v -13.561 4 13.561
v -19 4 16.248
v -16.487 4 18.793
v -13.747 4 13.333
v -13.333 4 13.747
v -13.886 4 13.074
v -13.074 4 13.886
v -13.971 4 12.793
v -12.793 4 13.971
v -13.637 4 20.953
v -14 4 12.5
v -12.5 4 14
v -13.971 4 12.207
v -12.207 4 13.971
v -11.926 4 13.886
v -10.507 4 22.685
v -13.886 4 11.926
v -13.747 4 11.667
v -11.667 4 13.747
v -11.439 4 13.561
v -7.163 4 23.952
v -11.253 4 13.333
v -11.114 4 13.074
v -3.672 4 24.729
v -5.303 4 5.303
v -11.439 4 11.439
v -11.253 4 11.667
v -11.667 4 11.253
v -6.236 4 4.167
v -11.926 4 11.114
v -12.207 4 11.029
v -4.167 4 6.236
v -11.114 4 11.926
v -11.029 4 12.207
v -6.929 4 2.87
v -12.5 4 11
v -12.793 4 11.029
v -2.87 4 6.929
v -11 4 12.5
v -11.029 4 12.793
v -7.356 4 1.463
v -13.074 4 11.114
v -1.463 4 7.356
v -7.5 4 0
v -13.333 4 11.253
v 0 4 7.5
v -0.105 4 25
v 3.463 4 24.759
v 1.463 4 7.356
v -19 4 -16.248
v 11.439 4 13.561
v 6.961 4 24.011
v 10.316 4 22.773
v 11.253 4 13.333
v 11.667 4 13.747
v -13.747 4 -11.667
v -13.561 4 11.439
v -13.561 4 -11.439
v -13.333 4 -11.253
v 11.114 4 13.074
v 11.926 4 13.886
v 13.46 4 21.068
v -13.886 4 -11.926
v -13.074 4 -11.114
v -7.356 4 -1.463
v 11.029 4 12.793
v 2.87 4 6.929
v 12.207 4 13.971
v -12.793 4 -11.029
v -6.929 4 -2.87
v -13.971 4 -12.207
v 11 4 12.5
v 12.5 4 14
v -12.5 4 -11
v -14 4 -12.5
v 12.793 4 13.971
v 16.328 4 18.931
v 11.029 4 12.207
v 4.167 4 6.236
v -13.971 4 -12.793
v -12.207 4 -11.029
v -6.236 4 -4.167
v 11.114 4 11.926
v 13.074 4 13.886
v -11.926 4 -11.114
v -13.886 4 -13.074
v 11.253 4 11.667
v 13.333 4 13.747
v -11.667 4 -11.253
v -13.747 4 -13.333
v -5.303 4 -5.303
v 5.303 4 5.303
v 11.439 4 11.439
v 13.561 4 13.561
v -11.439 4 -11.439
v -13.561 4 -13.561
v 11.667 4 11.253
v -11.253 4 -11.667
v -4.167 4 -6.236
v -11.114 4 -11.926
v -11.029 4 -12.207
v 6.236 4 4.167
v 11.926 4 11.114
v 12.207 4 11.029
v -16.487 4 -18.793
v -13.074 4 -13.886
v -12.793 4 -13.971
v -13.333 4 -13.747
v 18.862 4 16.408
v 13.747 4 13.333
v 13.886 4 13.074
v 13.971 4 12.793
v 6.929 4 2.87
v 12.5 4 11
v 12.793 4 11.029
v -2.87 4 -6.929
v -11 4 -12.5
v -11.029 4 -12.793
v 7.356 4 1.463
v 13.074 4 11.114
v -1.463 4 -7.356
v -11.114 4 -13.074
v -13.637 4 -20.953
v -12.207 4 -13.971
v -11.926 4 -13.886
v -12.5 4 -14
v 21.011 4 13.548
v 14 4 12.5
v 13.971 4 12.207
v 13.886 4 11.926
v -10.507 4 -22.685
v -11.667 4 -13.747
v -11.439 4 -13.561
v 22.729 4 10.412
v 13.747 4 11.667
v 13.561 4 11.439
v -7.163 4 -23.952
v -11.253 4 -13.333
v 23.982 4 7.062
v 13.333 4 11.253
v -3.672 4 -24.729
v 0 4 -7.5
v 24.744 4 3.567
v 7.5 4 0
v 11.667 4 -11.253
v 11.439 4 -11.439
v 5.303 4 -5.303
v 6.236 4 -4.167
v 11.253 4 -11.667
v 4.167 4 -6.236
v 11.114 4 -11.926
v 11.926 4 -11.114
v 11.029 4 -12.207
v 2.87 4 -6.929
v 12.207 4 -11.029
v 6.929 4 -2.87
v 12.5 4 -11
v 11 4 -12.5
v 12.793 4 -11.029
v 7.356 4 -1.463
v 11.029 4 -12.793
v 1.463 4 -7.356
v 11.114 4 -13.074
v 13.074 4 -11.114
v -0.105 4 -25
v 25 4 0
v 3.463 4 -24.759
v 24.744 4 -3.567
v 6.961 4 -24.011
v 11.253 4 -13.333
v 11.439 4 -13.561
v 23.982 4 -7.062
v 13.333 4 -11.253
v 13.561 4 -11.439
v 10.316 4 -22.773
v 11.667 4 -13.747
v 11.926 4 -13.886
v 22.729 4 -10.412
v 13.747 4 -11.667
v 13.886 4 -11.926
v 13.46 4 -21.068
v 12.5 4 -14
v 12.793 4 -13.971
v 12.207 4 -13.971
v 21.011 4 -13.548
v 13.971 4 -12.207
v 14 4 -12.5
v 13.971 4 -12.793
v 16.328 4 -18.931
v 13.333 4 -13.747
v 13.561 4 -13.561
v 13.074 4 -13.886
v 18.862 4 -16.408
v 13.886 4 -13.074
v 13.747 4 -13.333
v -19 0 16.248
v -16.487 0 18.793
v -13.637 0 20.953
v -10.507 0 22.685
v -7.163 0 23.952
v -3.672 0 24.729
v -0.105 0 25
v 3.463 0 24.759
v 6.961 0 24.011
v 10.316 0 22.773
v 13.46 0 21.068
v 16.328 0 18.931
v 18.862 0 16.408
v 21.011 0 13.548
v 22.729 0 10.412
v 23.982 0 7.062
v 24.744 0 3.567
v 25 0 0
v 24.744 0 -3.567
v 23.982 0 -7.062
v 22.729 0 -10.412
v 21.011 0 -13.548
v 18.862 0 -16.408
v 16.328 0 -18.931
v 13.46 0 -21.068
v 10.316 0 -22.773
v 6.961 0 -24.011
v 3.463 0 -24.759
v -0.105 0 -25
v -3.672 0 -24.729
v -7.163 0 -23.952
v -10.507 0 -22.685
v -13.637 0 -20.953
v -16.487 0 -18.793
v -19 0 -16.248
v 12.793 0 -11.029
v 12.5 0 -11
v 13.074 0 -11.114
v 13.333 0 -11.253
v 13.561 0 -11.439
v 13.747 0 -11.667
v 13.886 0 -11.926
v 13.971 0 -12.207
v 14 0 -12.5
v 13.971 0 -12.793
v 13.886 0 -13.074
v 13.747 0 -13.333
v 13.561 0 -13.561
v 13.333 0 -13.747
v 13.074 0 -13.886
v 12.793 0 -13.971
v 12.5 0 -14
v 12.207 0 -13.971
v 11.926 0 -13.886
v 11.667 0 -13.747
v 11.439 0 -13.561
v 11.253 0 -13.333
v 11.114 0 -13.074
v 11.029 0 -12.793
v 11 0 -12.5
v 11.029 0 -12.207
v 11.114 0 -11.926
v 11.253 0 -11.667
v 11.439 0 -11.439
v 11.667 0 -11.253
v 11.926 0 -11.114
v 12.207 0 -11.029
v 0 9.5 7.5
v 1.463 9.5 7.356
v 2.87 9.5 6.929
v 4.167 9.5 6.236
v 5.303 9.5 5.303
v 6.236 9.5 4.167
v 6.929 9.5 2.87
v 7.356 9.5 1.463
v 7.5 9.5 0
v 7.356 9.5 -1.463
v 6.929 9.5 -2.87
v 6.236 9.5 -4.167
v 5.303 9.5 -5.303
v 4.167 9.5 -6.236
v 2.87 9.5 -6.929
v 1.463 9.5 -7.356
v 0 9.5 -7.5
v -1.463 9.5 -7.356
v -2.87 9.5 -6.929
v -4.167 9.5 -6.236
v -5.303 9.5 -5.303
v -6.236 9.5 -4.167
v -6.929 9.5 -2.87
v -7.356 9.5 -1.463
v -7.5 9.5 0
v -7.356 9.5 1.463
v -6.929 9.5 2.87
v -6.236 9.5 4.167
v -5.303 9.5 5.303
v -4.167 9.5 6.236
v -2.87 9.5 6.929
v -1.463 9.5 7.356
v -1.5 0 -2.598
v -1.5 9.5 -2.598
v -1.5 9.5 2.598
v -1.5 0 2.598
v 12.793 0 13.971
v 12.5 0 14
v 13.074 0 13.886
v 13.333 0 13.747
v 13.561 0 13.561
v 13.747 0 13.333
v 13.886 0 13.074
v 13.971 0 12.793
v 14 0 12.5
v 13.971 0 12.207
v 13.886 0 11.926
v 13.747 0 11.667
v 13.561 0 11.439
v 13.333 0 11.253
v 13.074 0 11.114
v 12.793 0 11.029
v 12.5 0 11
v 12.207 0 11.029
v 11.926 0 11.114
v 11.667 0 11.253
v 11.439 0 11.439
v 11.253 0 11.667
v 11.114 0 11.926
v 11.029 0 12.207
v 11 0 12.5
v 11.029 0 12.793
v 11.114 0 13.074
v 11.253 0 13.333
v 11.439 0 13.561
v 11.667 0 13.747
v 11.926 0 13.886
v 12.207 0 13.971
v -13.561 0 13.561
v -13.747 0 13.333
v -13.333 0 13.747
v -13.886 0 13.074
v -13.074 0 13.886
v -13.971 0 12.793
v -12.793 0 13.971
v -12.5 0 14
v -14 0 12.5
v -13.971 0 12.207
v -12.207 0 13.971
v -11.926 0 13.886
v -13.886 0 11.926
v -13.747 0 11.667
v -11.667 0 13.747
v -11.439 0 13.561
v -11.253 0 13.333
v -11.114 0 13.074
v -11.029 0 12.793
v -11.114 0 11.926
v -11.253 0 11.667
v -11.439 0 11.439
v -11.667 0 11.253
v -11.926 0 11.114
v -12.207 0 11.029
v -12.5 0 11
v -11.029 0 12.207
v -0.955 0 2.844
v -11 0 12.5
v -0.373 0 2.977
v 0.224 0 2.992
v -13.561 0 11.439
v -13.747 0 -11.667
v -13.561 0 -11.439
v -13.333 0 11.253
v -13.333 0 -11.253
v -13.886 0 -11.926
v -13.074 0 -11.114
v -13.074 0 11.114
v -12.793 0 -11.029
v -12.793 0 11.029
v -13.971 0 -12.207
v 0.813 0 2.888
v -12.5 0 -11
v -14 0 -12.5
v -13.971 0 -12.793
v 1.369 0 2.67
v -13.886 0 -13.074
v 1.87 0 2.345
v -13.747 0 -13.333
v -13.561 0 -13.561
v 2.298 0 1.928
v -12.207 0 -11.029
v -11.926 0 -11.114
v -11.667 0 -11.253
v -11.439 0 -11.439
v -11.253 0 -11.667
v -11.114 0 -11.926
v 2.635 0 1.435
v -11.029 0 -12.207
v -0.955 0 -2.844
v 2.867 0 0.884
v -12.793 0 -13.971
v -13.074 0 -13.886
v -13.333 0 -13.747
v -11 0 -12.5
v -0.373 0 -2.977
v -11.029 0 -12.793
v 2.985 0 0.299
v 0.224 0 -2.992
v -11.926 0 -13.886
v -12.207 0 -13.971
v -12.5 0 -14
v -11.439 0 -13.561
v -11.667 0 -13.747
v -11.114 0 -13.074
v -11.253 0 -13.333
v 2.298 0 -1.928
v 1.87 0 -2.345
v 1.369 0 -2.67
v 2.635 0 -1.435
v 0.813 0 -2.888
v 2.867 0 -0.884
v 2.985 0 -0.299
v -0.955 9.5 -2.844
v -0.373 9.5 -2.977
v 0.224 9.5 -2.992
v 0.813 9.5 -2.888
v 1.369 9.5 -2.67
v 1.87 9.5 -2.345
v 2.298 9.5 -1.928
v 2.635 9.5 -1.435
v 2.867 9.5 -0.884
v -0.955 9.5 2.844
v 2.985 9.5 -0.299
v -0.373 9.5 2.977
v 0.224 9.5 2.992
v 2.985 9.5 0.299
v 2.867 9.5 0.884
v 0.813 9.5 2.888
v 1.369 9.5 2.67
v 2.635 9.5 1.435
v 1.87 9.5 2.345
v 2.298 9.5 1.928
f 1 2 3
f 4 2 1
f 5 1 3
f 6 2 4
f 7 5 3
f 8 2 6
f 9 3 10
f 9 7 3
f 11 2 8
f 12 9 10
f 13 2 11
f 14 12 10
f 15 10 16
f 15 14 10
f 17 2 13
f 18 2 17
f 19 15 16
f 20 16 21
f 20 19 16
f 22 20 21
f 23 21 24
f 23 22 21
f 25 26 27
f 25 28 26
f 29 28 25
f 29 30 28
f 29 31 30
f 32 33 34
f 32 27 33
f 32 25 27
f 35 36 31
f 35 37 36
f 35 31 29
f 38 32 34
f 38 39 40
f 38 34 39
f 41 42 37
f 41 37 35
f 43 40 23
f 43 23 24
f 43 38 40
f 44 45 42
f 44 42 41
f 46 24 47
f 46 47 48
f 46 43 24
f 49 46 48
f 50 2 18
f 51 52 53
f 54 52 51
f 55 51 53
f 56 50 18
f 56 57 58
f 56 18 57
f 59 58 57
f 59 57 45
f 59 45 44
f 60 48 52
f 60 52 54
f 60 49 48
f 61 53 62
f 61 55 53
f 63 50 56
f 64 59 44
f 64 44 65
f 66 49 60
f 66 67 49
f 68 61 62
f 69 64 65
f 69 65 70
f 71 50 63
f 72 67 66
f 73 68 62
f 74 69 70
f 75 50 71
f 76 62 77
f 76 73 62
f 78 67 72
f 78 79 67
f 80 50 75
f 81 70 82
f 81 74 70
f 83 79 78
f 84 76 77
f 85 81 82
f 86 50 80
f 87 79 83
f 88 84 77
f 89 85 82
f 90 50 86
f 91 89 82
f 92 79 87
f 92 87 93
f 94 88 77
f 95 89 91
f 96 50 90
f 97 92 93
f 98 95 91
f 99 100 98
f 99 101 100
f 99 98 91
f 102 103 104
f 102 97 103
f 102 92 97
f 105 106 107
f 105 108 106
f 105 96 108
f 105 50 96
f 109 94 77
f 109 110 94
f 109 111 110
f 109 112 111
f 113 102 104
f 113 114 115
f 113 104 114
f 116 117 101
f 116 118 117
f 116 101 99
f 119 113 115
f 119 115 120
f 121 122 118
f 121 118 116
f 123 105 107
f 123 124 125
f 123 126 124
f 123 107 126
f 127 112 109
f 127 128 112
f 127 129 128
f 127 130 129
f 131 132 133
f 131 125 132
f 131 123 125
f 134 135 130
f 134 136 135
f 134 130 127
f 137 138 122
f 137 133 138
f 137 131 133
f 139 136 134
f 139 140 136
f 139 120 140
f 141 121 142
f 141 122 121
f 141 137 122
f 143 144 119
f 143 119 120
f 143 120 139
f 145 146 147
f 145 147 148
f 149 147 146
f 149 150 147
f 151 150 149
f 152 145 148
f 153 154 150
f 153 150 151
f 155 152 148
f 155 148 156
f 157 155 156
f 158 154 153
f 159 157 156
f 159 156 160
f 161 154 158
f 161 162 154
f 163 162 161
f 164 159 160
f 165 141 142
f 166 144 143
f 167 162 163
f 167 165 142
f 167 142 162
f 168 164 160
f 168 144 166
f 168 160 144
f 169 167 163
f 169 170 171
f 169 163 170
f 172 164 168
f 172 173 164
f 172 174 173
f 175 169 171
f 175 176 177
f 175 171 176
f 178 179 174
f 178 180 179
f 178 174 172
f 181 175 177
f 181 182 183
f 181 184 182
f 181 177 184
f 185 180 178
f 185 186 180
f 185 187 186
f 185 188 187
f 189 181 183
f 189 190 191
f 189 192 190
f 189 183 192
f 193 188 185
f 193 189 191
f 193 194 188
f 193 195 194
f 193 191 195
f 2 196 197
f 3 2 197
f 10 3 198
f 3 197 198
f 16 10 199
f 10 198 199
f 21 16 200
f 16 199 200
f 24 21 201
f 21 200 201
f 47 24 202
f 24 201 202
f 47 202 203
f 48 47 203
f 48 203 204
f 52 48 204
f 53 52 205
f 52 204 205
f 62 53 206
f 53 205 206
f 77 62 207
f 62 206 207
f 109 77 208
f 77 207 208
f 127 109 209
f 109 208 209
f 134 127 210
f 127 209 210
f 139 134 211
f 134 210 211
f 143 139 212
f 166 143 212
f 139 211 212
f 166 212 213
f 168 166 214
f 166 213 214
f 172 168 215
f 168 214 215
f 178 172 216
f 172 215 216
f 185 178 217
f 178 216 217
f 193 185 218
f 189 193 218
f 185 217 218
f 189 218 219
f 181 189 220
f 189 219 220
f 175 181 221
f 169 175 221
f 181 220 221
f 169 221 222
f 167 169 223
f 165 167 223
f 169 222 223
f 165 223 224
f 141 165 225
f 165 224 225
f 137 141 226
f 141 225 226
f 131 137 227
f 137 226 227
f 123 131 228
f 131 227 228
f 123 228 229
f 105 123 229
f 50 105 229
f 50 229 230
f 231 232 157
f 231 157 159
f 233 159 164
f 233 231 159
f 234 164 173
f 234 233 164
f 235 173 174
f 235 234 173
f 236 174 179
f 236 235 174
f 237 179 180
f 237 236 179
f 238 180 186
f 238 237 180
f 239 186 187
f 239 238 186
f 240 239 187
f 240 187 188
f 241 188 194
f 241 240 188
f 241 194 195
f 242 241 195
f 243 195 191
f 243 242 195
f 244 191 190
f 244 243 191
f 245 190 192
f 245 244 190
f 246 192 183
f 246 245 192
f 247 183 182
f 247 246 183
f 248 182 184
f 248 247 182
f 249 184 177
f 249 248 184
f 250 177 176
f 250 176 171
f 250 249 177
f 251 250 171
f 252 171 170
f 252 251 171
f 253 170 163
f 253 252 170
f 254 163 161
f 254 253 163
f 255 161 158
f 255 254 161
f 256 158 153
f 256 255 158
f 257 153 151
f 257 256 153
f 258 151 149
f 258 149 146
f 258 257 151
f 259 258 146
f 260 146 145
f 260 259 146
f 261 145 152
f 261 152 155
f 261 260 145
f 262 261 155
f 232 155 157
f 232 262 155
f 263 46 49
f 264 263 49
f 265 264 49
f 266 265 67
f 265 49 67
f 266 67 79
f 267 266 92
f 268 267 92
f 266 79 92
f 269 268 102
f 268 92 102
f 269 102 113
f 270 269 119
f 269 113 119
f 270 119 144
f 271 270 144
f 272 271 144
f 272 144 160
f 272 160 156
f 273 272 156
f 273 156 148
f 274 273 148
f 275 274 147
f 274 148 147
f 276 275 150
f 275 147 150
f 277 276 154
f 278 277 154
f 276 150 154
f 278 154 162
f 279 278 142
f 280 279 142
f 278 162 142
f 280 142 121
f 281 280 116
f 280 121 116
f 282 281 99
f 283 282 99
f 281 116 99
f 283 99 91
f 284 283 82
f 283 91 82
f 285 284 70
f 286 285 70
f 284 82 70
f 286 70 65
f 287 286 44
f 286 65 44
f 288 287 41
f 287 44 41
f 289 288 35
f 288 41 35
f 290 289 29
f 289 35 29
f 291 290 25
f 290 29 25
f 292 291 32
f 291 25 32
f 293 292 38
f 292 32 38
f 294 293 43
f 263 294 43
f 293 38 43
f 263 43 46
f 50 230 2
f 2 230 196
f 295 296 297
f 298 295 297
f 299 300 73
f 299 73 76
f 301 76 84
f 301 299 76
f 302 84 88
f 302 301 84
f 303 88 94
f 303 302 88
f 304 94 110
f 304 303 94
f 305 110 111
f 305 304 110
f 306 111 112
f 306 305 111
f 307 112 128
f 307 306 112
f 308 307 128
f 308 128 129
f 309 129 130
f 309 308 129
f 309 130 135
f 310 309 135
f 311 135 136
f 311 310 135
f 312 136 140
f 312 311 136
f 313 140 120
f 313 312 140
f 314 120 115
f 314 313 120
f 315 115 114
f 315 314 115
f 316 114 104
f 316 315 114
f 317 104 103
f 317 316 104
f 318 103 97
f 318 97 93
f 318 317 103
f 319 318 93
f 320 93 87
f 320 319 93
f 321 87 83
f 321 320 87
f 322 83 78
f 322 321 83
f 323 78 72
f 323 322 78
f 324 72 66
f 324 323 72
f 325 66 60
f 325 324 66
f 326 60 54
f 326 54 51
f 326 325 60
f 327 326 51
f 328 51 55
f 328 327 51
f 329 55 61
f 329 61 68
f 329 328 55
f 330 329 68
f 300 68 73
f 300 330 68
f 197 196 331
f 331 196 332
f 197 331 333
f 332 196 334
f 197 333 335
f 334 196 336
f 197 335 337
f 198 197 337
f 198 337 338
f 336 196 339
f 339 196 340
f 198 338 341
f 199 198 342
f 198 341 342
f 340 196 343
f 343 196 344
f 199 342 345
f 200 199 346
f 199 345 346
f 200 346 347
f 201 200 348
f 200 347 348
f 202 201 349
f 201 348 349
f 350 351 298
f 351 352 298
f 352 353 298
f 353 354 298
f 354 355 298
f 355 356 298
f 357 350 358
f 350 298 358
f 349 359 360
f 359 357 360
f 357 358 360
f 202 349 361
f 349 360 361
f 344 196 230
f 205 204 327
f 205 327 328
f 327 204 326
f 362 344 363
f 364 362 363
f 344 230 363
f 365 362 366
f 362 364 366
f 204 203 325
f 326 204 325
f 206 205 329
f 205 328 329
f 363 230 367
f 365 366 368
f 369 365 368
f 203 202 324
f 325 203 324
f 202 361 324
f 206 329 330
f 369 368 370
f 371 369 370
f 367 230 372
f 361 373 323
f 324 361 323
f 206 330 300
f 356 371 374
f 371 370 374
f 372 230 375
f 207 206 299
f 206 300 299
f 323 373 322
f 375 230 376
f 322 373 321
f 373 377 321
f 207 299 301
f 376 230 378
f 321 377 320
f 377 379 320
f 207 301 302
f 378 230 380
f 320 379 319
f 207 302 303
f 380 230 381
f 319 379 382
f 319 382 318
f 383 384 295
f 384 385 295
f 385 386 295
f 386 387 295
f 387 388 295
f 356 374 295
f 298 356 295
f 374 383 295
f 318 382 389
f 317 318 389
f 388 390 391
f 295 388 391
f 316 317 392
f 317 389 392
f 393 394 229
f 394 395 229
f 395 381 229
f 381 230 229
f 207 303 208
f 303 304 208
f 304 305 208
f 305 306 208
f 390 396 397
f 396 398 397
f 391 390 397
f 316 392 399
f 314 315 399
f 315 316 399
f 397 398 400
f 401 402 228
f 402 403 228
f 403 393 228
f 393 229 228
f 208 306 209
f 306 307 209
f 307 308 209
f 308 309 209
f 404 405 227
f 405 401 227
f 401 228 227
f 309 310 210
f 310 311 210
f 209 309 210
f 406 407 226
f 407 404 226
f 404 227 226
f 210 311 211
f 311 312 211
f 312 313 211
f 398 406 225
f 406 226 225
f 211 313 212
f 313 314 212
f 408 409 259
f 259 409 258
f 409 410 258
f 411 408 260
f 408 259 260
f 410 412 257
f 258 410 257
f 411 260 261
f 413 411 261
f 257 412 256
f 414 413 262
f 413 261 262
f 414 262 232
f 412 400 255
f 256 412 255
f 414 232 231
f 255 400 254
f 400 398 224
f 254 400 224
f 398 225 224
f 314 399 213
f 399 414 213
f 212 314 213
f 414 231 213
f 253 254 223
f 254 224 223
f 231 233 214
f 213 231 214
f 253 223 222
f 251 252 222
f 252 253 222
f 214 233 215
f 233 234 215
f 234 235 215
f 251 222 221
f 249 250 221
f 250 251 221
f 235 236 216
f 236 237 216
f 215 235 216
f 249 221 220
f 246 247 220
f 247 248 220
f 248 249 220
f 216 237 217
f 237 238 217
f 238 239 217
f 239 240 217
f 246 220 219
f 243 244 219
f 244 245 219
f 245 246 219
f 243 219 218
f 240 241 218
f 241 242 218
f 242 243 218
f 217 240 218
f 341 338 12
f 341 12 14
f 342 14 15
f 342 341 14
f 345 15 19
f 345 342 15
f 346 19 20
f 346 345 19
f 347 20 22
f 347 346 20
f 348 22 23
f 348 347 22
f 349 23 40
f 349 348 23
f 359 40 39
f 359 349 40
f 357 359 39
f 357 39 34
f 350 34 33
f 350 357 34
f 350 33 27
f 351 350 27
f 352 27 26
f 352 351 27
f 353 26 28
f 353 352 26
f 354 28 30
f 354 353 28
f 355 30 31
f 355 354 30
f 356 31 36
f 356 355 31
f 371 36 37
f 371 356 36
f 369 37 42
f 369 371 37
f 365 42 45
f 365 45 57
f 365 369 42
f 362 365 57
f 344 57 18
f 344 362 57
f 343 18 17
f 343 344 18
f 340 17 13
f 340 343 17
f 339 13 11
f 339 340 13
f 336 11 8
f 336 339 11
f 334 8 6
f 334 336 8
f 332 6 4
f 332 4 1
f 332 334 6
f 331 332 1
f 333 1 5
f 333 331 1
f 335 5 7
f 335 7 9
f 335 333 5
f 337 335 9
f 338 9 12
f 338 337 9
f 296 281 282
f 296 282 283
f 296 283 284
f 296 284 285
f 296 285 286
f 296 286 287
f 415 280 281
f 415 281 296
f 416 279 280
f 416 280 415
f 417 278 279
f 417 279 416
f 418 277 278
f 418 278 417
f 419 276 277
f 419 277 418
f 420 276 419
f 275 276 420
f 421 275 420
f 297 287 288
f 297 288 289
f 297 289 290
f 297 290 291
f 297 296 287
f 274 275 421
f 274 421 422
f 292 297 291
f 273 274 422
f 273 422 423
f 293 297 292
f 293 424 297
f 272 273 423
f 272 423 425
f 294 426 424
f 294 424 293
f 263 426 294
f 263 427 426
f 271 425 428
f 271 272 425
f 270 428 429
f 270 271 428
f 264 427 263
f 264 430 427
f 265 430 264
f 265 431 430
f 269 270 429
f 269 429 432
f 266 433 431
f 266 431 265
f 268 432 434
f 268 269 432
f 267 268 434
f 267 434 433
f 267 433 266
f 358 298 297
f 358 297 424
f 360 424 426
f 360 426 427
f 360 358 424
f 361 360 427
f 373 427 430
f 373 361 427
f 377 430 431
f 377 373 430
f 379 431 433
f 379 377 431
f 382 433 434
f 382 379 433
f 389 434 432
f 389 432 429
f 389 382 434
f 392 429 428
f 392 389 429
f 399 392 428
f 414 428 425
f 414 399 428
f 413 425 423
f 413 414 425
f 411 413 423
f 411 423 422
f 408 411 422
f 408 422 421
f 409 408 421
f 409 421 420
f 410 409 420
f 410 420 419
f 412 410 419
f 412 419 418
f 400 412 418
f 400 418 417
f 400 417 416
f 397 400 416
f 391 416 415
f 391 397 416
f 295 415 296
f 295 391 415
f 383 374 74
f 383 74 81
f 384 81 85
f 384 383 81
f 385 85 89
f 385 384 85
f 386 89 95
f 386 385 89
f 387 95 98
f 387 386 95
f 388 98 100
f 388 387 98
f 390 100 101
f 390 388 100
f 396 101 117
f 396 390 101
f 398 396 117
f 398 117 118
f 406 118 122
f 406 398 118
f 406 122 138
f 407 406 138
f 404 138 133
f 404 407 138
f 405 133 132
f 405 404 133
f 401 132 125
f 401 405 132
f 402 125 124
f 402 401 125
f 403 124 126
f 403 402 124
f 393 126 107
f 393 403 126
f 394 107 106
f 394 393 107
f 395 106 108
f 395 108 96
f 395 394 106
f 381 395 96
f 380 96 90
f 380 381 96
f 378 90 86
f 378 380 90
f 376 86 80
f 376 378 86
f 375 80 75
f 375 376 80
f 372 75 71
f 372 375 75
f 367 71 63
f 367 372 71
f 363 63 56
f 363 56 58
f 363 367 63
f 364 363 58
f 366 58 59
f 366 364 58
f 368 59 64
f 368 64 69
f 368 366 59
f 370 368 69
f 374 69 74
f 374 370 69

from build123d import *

# Parameters (mm, degrees)
SKETCH1_R           = 1.5
BOSS_EXTRUDE1_DEPTH = 4
SKETCH2_R           = 7.5
BOSS_EXTRUDE2_DEPTH = 5.5


with BuildPart() as part:
    # Sketch1 → Boss-Extrude1 (new body)
    with BuildSketch(Plane(origin=(0, 0, 0), x_dir=(1, 0, 0), z_dir=(0, 1, 0))):
        with BuildLine():
            Line((-19, 16.248076809), (-19, -16.248076809))
            ThreePointArc((-19, -16.248076809), (25, 0), (-19, 16.248076809))
        make_face()
        with Locations(Location((12.5, 12.5, 0), (0, 0, 270))):
            Circle(SKETCH1_R, mode=Mode.SUBTRACT)
        with Locations(Location((12.5, -12.5, 0), (0, 0, 270))):
            Circle(SKETCH1_R, mode=Mode.SUBTRACT)
        with Locations(Location((-12.5, -12.5, 0), (0, 0, 270))):
            Circle(SKETCH1_R, mode=Mode.SUBTRACT)
        with Locations(Location((-12.5, 12.5, 0), (0, 0, 270))):
            Circle(SKETCH1_R, mode=Mode.SUBTRACT)
        with BuildLine():
            Line((-1.5, 2.598076211), (-1.5, -2.598076211))
            ThreePointArc((-1.5, -2.598076211), (3, 0), (-1.5, 2.598076211))
        make_face(mode=Mode.SUBTRACT)
    extrude(amount=BOSS_EXTRUDE1_DEPTH)

    # Sketch2 → Boss-Extrude2 (add)
    with BuildSketch(Plane(origin=(0, 4, 0), x_dir=(1, 0, 0), z_dir=(0, 1, 0))):
        with Locations(Location((0, 0, 0), (0, 0, 270))):
            Circle(SKETCH2_R)
        with BuildLine():
            Line((-1.5, 2.598076211), (-1.5, -2.598076211))
            ThreePointArc((-1.5, -2.598076211), (3, 0), (-1.5, 2.598076211))
        make_face(mode=Mode.SUBTRACT)
    extrude(amount=BOSS_EXTRUDE2_DEPTH)


solid = part.part
